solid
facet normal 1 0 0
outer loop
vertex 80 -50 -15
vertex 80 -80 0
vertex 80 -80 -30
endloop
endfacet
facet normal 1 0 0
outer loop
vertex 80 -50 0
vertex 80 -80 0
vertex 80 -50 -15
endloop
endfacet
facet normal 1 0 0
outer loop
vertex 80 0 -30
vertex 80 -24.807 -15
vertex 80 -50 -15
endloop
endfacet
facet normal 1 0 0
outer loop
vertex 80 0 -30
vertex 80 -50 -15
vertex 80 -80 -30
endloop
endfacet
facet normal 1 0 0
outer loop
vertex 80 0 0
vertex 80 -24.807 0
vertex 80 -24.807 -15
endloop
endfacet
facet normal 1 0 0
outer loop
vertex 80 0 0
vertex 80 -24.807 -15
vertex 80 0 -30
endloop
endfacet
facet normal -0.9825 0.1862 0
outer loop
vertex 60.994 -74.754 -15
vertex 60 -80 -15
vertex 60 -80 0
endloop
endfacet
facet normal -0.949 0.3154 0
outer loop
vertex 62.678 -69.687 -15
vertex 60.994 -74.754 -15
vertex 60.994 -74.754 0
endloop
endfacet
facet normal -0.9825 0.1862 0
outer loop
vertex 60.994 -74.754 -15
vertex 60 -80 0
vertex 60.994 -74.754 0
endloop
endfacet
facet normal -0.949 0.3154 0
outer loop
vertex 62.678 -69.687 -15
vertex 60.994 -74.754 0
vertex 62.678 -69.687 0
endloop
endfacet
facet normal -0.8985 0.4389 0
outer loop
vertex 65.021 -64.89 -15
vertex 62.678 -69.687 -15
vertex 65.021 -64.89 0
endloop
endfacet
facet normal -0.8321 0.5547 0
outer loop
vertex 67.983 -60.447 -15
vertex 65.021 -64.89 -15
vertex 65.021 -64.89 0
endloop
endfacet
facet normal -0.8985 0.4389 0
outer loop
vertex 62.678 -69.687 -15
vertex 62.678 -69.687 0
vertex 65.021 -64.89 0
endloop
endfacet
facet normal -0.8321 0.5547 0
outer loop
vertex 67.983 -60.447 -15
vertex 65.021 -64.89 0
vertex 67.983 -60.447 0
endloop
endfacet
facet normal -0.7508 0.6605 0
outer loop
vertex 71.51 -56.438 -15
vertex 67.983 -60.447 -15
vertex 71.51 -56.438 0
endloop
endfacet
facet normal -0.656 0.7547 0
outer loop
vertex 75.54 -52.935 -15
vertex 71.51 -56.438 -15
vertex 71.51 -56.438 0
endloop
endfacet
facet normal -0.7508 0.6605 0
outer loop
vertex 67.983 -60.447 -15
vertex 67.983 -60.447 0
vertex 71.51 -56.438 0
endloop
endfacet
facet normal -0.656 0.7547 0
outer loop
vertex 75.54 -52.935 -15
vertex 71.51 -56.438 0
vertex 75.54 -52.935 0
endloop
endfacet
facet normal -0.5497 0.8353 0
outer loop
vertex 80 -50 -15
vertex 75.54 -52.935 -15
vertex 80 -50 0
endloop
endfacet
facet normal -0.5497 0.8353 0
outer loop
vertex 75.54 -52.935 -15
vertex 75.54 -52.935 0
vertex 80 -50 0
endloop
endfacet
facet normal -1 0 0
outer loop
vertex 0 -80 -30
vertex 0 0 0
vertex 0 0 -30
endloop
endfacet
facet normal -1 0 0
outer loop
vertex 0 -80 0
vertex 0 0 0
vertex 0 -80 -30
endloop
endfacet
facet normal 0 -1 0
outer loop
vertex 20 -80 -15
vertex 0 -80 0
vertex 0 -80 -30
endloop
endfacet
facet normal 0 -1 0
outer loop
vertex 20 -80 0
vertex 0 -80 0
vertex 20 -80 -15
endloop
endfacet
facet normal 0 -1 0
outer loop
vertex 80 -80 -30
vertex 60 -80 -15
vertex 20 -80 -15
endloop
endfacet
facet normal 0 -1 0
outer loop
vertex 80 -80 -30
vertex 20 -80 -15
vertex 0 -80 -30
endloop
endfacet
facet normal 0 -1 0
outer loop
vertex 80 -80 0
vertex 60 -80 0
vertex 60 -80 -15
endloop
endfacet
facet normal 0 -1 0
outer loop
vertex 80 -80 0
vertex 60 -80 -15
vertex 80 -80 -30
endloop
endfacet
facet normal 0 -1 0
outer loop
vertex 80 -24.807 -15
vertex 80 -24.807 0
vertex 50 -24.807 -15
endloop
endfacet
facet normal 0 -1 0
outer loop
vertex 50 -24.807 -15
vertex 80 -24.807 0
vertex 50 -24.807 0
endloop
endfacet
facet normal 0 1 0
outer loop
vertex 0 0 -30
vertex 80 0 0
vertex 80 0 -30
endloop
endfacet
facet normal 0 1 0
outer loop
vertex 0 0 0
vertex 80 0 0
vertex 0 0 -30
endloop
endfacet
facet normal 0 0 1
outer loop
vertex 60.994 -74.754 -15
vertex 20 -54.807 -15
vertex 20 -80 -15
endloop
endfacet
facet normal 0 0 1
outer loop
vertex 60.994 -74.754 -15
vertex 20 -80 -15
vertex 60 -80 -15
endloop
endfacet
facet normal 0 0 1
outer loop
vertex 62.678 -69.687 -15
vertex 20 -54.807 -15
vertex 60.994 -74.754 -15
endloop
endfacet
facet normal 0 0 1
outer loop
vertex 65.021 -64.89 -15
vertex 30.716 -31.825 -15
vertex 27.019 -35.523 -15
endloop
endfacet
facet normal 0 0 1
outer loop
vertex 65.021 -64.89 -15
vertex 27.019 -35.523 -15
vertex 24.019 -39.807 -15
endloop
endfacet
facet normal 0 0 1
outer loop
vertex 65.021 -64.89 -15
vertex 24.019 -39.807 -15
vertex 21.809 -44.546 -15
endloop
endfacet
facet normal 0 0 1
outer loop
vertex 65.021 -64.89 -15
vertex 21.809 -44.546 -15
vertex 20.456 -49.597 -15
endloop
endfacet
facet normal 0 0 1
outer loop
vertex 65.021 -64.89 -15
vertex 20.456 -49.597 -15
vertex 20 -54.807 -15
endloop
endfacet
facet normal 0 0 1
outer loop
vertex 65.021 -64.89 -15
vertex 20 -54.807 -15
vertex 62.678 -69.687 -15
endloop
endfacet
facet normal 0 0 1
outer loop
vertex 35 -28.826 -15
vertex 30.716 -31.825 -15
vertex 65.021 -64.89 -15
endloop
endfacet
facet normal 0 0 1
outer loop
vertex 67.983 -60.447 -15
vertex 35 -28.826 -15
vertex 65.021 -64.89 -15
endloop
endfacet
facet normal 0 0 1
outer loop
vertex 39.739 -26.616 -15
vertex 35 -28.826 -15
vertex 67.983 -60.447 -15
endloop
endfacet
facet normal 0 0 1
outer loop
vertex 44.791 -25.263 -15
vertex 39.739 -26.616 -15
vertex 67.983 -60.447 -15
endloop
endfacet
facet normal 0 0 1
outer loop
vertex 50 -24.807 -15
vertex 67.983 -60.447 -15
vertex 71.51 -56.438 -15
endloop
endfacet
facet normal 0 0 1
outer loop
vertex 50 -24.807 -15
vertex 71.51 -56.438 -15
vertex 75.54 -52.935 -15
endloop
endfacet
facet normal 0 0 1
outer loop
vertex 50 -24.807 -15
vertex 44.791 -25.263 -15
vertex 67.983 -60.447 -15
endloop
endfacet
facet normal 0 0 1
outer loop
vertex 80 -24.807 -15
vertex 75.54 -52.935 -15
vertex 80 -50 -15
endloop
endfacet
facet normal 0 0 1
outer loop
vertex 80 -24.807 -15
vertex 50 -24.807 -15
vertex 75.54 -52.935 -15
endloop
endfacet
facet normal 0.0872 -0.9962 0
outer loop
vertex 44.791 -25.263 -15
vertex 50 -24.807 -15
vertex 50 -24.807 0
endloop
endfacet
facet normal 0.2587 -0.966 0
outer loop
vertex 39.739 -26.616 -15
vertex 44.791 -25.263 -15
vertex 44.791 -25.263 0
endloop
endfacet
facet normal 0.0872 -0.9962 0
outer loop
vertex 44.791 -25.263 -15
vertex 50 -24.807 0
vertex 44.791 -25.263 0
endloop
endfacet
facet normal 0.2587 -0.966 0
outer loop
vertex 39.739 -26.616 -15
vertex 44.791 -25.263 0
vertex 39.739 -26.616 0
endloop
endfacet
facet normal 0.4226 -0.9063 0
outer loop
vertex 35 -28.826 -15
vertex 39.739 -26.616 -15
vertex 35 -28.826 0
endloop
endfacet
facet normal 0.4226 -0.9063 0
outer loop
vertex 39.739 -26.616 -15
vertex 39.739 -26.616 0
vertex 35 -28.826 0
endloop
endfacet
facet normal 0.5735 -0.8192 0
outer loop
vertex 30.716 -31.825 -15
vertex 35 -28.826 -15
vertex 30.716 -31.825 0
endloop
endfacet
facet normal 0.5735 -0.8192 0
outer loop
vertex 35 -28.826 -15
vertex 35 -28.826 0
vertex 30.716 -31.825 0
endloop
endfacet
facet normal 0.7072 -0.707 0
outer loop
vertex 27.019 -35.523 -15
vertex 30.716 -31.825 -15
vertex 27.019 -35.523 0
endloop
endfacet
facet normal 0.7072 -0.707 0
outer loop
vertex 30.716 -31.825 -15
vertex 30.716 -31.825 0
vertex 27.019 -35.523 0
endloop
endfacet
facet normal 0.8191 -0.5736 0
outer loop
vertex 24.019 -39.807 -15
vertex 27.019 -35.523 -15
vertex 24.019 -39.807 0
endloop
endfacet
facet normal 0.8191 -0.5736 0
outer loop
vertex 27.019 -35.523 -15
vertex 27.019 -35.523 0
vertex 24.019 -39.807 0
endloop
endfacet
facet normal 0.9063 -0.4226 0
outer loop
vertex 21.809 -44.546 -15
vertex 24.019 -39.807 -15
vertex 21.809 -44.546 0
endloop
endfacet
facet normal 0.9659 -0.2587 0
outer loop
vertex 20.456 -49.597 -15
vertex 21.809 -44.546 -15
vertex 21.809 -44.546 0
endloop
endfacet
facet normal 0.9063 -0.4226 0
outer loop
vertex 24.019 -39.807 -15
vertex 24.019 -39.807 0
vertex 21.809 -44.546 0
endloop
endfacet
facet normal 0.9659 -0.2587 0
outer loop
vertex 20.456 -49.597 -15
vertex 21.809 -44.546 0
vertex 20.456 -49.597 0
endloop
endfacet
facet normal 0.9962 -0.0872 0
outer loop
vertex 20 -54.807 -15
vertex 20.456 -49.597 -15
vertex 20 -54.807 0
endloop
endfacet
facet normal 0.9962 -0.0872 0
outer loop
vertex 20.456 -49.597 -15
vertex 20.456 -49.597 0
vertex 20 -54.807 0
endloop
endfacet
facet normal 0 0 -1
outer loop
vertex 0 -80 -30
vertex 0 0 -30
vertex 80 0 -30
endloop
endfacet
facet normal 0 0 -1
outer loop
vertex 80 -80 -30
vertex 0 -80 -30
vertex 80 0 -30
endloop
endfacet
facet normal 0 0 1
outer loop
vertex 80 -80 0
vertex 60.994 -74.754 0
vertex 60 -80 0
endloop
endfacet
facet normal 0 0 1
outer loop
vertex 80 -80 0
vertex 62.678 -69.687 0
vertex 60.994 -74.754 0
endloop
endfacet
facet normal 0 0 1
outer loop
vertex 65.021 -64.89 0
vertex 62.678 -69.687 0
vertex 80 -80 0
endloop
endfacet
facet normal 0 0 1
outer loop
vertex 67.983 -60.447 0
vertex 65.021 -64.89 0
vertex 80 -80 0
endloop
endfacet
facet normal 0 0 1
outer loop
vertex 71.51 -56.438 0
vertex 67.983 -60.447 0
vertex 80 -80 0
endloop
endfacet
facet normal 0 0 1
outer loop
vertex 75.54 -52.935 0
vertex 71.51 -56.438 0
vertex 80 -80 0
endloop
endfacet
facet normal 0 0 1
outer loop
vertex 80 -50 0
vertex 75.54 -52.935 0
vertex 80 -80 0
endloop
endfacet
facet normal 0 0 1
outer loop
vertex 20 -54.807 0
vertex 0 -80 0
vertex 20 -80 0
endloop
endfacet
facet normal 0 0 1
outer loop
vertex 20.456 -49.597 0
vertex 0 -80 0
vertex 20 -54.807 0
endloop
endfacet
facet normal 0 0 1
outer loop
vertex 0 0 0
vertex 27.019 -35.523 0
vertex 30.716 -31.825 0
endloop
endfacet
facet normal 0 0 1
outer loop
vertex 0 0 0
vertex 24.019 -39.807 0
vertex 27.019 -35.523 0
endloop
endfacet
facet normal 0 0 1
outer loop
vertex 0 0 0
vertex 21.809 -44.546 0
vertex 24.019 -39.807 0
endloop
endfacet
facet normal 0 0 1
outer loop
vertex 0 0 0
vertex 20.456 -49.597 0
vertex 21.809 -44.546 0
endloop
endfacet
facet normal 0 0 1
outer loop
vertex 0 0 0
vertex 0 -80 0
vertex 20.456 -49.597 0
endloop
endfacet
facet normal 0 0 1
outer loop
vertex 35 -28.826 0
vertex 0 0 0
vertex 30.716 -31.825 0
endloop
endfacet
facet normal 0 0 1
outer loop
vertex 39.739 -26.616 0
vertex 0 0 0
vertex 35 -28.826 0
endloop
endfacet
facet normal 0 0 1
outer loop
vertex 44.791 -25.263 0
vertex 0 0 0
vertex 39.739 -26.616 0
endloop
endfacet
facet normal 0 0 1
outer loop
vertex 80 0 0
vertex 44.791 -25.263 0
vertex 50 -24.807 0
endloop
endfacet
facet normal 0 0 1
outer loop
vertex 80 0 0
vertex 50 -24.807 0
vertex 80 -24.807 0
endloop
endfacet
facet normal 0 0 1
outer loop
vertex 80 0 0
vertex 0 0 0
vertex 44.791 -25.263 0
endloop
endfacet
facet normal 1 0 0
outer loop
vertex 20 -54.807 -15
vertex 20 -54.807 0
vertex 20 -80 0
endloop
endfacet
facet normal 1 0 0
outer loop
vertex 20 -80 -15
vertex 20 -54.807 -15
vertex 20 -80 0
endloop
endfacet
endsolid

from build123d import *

# Parameters (mm, degrees)
F1_DEPTH = 30
F2_DEPTH = 15


with BuildPart() as f1:
    # F0 (on Top) → F1 (new body)
    with BuildSketch(Plane.XY):
        with BuildLine():
            Line((80, 0), (0, 0))
            Line((0, 0), (0, -80))
            Line((0, -80), (20, -80))
            Line((20, -80), (20, -54.806759))
            ThreePointArc((20, -54.806759), (28.786797, -33.593555), (50, -24.806759))
            Line((50, -24.806759), (80, -24.806759))
            Line((80, -24.806759), (80, 0))
        make_face()
        with BuildLine():
            Line((80, -50), (80, -24.806759))
            Line((80, -24.806759), (50, -24.806759))
            ThreePointArc((50, -24.806759), (28.786797, -33.593555), (20, -54.806759))
            Line((20, -54.806759), (20, -80))
            Line((20, -80), (60, -80))
            ThreePointArc((60, -80), (66.428126, -62.618751), (80, -50))
        make_face()
        with BuildLine():
            Line((80, -80), (80, -50))
            ThreePointArc((80, -50), (66.428126, -62.618751), (60, -80))
            Line((60, -80), (80, -80))
        make_face()
    extrude(amount=-F1_DEPTH)

    # F0 (on Top) → F2 (cut)
    with BuildSketch(Plane.XY):
        with BuildLine():
            Line((80, -50), (80, -24.806759))
            Line((80, -24.806759), (50, -24.806759))
            ThreePointArc((50, -24.806759), (28.786797, -33.593555), (20, -54.806759))
            Line((20, -54.806759), (20, -80))
            Line((20, -80), (60, -80))
            ThreePointArc((60, -80), (66.428126, -62.618751), (80, -50))
        make_face()
    extrude(amount=-F2_DEPTH, mode=Mode.SUBTRACT)


solid = f1.part
